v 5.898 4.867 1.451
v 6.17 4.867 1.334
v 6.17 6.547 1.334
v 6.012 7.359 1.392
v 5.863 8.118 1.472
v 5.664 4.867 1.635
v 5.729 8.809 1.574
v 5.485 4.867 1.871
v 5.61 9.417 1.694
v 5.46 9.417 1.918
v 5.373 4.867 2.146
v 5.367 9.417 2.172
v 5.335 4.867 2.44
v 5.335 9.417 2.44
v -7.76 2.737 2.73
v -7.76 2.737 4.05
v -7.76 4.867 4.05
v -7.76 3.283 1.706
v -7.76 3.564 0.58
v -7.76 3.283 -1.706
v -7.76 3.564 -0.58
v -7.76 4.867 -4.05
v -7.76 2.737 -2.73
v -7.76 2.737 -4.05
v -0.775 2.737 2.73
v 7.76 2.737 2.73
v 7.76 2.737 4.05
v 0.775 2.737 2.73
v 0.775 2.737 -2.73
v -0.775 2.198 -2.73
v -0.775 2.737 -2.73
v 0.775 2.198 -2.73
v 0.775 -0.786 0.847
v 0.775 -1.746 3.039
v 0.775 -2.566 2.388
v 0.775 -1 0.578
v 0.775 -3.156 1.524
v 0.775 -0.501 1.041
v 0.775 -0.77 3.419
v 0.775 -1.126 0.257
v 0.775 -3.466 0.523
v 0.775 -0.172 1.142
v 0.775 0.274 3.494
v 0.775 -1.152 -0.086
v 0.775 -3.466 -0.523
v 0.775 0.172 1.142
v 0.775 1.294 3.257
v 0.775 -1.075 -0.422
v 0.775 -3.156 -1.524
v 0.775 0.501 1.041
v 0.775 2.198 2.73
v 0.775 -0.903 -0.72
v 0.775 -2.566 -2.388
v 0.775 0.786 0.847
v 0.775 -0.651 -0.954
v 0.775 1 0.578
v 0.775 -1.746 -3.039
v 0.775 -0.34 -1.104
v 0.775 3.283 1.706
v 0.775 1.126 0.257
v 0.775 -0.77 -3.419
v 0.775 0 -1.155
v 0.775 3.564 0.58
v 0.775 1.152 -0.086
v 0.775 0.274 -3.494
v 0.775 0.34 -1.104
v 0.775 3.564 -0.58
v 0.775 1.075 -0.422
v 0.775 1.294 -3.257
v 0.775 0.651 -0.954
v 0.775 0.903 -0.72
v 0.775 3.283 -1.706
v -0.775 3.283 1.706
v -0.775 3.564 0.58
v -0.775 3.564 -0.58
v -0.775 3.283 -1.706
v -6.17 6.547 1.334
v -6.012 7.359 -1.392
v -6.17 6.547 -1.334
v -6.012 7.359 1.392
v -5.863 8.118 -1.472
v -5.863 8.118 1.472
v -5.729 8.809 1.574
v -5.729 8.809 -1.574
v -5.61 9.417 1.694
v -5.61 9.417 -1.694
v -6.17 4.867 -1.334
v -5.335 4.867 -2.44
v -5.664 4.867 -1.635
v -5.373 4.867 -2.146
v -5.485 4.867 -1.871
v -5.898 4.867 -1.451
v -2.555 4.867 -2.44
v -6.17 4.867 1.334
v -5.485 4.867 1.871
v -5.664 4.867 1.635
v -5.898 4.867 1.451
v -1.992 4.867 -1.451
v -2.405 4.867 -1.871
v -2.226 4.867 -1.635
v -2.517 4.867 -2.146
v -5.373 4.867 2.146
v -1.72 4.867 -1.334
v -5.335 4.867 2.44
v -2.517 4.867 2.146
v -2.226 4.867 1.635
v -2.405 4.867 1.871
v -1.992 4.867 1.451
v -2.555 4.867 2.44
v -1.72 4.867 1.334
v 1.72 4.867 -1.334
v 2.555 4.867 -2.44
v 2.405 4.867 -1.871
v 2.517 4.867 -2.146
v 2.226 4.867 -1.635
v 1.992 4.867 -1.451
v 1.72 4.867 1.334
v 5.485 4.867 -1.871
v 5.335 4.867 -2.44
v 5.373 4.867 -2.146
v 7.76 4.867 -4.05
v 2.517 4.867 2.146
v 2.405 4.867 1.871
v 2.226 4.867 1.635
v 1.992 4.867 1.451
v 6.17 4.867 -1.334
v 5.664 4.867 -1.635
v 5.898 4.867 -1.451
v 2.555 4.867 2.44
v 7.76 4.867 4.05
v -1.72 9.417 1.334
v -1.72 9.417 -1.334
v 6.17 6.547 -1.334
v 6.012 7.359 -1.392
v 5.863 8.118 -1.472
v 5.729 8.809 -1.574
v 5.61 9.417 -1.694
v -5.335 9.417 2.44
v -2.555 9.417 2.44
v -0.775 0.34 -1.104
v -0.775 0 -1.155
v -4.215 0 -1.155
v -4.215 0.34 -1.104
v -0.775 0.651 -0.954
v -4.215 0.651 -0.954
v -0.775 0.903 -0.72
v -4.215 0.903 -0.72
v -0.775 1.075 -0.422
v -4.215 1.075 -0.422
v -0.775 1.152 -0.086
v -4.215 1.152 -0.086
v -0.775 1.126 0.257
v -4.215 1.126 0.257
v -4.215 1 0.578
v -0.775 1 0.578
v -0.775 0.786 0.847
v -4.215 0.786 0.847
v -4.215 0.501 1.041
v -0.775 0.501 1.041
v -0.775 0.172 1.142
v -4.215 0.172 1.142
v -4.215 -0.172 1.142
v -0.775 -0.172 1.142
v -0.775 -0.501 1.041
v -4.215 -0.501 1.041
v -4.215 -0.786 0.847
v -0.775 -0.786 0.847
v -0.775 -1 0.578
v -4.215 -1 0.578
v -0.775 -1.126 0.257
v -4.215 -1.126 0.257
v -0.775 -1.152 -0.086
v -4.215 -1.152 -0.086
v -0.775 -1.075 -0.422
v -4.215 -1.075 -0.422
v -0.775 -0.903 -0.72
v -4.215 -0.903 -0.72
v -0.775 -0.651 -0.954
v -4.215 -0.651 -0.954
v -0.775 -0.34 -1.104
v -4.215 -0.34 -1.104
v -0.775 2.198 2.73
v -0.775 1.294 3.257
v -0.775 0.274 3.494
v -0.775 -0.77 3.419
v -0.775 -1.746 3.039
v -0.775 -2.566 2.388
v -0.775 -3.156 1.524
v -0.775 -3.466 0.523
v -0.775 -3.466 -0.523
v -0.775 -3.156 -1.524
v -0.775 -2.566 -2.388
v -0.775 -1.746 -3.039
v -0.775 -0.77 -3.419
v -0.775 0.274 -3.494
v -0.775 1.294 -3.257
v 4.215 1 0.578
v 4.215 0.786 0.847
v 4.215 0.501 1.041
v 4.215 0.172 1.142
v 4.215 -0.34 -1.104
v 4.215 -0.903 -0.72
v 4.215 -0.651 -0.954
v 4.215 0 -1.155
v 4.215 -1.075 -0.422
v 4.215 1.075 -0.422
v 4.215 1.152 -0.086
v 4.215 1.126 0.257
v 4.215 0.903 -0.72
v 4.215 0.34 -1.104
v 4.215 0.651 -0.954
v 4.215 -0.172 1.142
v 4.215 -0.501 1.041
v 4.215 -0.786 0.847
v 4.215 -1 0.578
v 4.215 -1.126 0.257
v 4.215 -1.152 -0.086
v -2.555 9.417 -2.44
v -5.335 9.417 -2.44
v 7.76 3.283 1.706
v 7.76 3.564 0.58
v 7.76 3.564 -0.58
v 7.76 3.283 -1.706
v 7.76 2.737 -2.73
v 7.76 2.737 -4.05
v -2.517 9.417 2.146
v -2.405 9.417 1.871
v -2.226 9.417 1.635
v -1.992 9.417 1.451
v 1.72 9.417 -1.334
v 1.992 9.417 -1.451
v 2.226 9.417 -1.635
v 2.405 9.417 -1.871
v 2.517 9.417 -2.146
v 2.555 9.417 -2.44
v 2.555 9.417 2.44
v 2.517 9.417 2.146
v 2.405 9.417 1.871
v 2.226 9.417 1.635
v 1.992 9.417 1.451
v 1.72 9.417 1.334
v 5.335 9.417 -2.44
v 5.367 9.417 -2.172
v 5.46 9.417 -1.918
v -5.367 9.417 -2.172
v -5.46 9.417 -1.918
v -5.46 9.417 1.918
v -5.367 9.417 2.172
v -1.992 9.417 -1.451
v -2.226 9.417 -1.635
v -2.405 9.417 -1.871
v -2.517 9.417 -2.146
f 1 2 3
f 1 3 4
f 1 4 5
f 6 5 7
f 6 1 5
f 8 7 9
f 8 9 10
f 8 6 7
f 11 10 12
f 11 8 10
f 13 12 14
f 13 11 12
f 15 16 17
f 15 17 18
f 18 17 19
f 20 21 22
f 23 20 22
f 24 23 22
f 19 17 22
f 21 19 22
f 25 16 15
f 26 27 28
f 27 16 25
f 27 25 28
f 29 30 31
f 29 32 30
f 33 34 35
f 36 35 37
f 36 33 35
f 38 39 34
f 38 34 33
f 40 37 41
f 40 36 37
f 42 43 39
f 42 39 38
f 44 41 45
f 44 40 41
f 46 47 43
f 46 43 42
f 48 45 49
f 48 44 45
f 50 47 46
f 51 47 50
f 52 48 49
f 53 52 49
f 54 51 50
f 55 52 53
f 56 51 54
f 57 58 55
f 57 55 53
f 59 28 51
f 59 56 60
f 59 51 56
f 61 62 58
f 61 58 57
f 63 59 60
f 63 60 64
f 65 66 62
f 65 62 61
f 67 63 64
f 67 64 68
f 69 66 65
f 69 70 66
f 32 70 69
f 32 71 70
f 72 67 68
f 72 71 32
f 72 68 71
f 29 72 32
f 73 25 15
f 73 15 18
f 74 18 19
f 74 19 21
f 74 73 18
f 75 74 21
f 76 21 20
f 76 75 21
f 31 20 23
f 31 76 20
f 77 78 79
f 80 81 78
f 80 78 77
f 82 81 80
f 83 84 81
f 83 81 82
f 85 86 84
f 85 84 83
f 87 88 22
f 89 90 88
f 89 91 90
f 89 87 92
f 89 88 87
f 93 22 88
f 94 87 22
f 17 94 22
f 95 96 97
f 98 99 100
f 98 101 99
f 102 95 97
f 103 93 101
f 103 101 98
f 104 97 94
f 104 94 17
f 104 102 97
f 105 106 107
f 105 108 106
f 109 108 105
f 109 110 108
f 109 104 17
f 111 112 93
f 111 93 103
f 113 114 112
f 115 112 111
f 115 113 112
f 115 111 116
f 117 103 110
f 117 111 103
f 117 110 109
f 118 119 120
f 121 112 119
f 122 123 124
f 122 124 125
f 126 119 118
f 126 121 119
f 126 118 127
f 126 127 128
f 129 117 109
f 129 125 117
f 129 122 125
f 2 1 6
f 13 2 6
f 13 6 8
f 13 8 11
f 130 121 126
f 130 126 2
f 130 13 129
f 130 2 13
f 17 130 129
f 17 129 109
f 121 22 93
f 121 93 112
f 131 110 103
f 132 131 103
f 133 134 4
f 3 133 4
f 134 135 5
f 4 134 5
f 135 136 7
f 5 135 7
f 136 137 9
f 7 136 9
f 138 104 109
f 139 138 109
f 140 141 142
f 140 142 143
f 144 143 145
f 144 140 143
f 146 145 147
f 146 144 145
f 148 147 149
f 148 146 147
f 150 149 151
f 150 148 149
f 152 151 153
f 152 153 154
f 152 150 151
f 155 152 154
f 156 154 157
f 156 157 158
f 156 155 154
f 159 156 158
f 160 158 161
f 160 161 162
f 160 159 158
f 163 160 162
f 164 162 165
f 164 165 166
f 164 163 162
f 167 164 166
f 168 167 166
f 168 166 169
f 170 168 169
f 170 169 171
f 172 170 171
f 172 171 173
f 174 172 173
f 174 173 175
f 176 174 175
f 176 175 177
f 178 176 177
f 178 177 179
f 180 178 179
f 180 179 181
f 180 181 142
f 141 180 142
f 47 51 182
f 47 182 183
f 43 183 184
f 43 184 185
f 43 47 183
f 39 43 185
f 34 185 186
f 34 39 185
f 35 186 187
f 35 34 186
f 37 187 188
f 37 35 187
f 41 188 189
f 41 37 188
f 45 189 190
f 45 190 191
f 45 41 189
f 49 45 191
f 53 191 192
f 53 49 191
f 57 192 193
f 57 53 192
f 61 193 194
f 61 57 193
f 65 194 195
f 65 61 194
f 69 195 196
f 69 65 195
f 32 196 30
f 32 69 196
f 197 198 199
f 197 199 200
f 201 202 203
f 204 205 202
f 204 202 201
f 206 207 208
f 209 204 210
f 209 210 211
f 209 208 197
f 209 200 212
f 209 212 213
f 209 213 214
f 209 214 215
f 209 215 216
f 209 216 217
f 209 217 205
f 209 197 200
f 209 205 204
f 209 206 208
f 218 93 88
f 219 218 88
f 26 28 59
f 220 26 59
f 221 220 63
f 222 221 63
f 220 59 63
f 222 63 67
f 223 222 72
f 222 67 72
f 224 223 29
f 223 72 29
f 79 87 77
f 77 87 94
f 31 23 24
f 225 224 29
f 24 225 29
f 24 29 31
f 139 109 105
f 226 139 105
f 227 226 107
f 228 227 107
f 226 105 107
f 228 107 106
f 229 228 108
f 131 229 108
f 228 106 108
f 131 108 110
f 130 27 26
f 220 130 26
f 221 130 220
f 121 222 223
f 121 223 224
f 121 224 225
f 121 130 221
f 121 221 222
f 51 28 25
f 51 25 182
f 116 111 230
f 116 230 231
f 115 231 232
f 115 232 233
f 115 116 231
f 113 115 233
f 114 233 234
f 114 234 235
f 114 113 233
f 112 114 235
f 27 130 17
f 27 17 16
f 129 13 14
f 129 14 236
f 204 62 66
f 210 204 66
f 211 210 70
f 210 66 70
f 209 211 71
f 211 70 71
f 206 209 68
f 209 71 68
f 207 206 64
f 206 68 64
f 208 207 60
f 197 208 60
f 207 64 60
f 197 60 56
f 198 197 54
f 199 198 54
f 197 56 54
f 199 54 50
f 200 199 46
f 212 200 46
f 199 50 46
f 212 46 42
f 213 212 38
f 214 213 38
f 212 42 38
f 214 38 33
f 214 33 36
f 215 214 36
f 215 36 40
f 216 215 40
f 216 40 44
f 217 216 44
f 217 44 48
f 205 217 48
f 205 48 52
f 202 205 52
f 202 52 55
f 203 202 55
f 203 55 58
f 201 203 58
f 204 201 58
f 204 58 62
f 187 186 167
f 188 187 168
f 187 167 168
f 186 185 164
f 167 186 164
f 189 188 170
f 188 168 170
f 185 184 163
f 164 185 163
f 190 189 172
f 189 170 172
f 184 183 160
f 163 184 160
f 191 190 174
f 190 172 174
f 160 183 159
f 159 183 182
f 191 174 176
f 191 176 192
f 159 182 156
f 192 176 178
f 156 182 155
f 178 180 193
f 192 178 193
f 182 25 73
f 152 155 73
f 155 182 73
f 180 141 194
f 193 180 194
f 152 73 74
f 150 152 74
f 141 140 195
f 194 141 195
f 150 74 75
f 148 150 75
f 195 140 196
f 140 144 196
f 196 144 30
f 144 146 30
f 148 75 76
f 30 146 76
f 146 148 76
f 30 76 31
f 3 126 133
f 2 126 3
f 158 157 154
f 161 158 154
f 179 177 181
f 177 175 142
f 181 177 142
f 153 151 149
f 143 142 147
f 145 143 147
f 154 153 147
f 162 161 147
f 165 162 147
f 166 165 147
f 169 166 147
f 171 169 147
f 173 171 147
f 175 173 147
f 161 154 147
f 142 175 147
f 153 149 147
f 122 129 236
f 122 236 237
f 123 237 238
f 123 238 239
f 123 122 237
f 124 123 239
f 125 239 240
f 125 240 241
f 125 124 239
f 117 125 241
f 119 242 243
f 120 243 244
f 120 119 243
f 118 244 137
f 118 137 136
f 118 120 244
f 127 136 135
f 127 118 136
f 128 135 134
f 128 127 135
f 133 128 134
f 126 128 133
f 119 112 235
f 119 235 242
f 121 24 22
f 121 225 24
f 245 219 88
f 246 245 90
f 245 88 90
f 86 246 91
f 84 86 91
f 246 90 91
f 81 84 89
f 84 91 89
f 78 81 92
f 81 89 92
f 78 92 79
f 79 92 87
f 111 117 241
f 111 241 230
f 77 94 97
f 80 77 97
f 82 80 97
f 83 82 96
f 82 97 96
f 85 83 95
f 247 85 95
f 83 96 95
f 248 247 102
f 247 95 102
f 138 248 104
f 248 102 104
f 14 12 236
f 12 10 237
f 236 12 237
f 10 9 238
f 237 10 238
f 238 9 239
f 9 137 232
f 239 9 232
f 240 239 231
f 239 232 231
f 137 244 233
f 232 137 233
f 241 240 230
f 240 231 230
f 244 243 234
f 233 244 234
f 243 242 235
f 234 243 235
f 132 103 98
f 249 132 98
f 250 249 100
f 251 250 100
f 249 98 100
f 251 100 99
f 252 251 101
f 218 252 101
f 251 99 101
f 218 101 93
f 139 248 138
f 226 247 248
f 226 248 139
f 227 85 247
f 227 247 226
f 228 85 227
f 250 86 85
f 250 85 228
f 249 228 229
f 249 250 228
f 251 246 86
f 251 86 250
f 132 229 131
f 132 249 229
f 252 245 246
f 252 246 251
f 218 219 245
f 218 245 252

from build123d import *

# Parameters (mm, degrees)
SKETCH1_R           = 1.155
BOSS_EXTRUDE1_DEPTH = 4.215
SKETCH1_3_R         = 1.155
BOSS_EXTRUDE2_DEPTH = 0.775
BOSS_EXTRUDE3_DEPTH = 7.76
BOSS_EXTRUDE4_DEPTH = 4.55
CHAMFER1_SIZE       = 2.87
CHAMFER1_SIZE2      = 0.56


with BuildPart() as part:
    # Sketch1 → Boss-Extrude1 (new body)
    with BuildSketch(Plane(origin=(0, 0, 0), x_dir=(0, 0, -1), z_dir=(1, 0, 0))):
        Circle(SKETCH1_R)
    extrude(amount=BOSS_EXTRUDE1_DEPTH)

    # Sketch1<3> → Boss-Extrude2 (add)
    with BuildSketch(Plane(origin=(0, 0, 0), x_dir=(0, 0, -1), z_dir=(1, 0, 0))):
        with BuildLine():
            ThreePointArc((2.73, 2.737106893), (0, 3.6), (-2.73, 2.737106893))
            Line((-2.73, 2.737106893), (-2.73, 2.198209499))
            ThreePointArc((-2.73, 2.198209499), (0, -3.505), (2.73, 2.198209499))
            Line((2.73, 2.198209499), (2.73, 2.737106893))
        make_face()
        Circle(SKETCH1_3_R, mode=Mode.SUBTRACT)
    extrude(amount=BOSS_EXTRUDE2_DEPTH)

    # Sketch1<4> → Boss-Extrude3 (add)
    with BuildSketch(Plane(origin=(0, 0, 0), x_dir=(0, 0, -1), z_dir=(1, 0, 0))):
        with BuildLine():
            ThreePointArc((-2.73, 2.737106893), (0, 3.6), (2.73, 2.737106893))
            Line((2.73, 2.737106893), (4.05, 2.737106893))
            Line((4.05, 2.737106893), (4.05, 4.867106893))
            Line((4.05, 4.867106893), (-4.05, 4.867106893))
            Line((-4.05, 4.867106893), (-4.05, 2.737106893))
            Line((-4.05, 2.737106893), (-2.73, 2.737106893))
        make_face()
    extrude(amount=BOSS_EXTRUDE3_DEPTH)

    # Sketch2 → Boss-Extrude4 (add)
    with BuildSketch(Plane(origin=(0, 4.867106893, 0), x_dir=(1, 0, 0), z_dir=(0, 1, 0))):
        with BuildLine():
            Line((1.72, -1.333982369), (1.72, 1.333982369))
            ThreePointArc((1.72, 1.333982369), (2.322809893, 1.747089472), (2.555, 2.44))
            Line((2.555, 2.44), (5.335, 2.44))
            ThreePointArc((5.335, 2.44), (5.567190107, 1.747089472), (6.17, 1.333982369))
            Line((6.17, 1.333982369), (6.17, -1.333982369))
            ThreePointArc((6.17, -1.333982369), (5.567190107, -1.747089472), (5.335, -2.44))
            Line((5.335, -2.44), (2.555, -2.44))
            ThreePointArc((2.555, -2.44), (2.322809893, -1.747089472), (1.72, -1.333982369))
        make_face()
    extrude(amount=BOSS_EXTRUDE4_DEPTH)

    # Chamfer1
    chamfer1_edges = [part.edges().sort_by_distance(p)[0] for p in [
        (6.17, 9.417106893, 0),
    ]]
    chamfer1_side = [part.faces().sort_by_distance(p)[0] for p in [
        (6.17, 7.142106893, 0),
    ]]
    chamfer(chamfer1_edges, length=CHAMFER1_SIZE, length2=CHAMFER1_SIZE2, reference=chamfer1_side[0])

    # Mirror1: part across plane


with BuildPart() as part_1:
    add(part.part)
    add(part.part.mirror(Plane(origin=(0, 0, 0), x_dir=(0, 0, 1), z_dir=(1, 0, 0))))


solid = part_1.part
